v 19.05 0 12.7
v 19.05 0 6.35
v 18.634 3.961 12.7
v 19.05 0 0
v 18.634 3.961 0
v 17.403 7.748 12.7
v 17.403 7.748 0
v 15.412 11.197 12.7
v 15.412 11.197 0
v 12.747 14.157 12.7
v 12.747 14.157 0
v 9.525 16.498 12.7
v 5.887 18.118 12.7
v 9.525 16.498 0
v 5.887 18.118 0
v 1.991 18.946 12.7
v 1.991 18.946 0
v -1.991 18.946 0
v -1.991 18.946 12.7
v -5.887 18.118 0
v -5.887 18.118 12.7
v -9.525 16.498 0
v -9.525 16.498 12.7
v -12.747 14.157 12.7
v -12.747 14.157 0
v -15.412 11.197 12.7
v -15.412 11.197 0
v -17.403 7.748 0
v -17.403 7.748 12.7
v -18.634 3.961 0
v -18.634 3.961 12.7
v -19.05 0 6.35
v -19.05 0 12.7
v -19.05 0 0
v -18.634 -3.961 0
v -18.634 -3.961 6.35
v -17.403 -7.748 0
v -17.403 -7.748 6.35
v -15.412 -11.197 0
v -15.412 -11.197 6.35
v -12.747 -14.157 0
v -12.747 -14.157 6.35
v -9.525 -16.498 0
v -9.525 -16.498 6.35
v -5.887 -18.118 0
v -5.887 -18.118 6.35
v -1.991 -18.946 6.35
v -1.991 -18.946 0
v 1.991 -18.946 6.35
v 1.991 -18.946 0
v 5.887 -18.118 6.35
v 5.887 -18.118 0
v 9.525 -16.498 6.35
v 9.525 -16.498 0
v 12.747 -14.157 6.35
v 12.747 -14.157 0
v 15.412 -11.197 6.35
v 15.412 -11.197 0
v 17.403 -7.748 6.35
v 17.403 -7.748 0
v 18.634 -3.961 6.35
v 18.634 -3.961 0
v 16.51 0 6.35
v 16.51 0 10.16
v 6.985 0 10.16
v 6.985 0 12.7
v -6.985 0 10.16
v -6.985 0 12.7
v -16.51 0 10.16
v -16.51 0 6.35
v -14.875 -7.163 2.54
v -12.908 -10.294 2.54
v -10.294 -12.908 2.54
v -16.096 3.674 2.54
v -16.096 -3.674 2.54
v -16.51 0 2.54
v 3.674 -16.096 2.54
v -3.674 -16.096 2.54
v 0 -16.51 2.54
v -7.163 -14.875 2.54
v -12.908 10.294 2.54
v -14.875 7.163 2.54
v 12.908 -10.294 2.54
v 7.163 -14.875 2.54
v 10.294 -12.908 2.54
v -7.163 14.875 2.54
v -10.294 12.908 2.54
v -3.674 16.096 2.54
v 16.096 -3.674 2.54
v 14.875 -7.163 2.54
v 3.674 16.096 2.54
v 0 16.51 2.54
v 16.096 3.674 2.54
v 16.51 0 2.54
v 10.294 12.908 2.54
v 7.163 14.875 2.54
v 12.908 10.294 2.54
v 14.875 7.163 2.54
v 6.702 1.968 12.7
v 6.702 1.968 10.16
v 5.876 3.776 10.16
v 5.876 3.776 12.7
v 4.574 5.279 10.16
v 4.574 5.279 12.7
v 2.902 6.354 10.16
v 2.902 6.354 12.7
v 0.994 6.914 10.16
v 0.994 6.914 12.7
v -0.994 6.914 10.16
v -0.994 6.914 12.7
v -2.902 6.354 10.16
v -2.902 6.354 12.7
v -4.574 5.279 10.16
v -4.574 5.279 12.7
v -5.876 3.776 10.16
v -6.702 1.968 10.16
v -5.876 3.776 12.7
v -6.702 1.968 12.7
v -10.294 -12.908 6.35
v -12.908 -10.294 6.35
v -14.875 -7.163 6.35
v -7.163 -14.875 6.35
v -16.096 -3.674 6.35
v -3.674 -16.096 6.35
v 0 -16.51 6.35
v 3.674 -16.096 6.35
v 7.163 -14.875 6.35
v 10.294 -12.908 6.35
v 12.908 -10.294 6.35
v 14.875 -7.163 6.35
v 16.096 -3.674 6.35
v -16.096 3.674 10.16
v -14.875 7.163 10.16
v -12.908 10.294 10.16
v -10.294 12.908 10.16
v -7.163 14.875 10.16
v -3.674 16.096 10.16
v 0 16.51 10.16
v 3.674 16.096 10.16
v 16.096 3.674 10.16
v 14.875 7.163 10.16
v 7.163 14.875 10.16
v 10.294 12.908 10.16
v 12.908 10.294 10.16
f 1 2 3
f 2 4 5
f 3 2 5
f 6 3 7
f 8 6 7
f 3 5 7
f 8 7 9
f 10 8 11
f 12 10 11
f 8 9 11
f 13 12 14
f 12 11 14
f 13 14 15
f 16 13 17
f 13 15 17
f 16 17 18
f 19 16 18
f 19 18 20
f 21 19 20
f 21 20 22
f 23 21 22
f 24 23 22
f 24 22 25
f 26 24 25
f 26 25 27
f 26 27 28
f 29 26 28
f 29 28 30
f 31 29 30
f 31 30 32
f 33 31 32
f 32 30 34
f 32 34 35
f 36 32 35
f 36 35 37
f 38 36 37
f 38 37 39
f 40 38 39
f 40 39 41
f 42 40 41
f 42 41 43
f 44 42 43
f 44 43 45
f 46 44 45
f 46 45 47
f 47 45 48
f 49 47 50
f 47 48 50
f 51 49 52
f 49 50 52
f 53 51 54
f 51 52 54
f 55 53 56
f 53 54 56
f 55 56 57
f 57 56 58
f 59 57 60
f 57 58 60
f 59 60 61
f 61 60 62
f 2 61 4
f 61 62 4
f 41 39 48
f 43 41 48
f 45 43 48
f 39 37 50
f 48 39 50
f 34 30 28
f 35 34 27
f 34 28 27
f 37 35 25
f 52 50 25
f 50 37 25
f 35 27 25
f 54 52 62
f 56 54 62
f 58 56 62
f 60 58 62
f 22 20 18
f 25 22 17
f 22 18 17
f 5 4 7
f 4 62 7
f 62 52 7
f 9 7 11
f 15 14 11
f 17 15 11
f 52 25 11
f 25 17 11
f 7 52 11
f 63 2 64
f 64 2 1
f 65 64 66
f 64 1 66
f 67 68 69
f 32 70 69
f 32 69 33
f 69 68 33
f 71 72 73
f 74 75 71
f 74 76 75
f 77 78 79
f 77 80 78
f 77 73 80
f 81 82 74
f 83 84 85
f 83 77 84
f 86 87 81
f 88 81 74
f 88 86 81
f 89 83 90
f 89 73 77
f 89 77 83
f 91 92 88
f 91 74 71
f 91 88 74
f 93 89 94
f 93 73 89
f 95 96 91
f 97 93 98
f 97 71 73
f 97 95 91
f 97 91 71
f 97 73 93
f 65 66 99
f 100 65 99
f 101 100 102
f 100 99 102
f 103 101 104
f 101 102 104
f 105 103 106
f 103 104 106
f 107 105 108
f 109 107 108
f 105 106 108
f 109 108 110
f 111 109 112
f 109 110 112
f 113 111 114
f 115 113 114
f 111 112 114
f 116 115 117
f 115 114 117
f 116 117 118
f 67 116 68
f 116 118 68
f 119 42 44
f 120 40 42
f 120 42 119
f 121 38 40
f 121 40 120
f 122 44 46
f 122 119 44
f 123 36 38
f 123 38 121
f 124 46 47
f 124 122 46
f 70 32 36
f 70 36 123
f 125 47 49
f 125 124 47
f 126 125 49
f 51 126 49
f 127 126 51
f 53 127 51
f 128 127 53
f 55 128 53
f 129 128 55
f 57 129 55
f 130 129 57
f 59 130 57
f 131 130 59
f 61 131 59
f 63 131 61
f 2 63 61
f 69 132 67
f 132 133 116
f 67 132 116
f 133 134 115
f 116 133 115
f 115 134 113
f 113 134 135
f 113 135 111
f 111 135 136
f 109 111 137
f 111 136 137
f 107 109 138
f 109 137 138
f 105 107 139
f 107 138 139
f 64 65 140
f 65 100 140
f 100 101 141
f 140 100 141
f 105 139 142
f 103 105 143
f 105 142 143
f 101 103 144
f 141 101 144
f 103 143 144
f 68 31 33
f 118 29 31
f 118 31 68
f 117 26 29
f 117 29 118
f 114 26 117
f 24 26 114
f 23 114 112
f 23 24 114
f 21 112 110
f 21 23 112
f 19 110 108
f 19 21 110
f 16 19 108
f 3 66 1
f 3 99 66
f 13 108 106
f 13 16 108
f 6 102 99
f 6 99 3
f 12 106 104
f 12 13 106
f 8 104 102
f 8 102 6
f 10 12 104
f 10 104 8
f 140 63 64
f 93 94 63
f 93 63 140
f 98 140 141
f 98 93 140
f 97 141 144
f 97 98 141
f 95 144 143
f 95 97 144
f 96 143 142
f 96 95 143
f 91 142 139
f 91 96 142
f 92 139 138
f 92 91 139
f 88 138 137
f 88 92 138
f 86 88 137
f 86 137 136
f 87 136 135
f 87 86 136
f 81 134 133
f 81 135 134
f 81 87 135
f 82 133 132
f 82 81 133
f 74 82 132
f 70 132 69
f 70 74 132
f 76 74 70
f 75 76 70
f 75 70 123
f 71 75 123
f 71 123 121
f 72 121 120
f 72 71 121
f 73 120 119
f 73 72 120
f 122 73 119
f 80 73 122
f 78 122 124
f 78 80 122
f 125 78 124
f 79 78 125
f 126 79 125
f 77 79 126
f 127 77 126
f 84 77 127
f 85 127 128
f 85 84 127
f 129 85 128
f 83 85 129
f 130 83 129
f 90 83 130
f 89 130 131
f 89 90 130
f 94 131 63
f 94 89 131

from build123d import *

# Parameters (mm, degrees)
F0_R     = 19.05
F1_DEPTH = 12.7
F3_DEPTH = 6.35
F4_T     = -2.54
F6_DEPTH = 5.08


with BuildPart() as f1:
    # F0 (on Top) → F1 (new body)
    with BuildSketch(Plane.XY):
        Circle(F0_R)
    extrude(amount=F1_DEPTH)

    # F2 (on face) → F3 (cut)
    with BuildSketch(Plane.XY.offset(12.7)):
        with BuildLine():
            ThreePointArc((19.05, 0), (0, -19.05), (-19.05, 0))
            Line((-19.05, 0), (-19.05, -19.4337088615))
            Line((-19.05, -19.4337088615), (19.2441120744, -19.4337088615))
            Line((19.2441120744, -19.4337088615), (19.2441120744, 0))
            Line((19.2441120744, 0), (19.05, 0))
        make_face()
        with BuildLine():
            Line((19.05, 0), (-19.05, 0))
            ThreePointArc((-19.05, 0), (0, -19.05), (19.05, 0))
        make_face()
    extrude(amount=-F3_DEPTH, mode=Mode.SUBTRACT)

    # F4
    f4_openings = [f1.faces().sort_by_distance(p)[0] for p in [
        (0, 0, 9.525),
        (0, -8.085071, 6.35),
    ]]
    offset(amount=F4_T, openings=f4_openings)

    # F5 (on face) → F6 (cut)
    with BuildSketch(Plane.XY.offset(12.7)):
        with BuildLine():
            Line((-6.985, 0), (6.985, 0))
            ThreePointArc((6.985, 0), (0, 6.985), (-6.985, 0))
        make_face()
    extrude(amount=-F6_DEPTH, mode=Mode.SUBTRACT)


solid = f1.part
